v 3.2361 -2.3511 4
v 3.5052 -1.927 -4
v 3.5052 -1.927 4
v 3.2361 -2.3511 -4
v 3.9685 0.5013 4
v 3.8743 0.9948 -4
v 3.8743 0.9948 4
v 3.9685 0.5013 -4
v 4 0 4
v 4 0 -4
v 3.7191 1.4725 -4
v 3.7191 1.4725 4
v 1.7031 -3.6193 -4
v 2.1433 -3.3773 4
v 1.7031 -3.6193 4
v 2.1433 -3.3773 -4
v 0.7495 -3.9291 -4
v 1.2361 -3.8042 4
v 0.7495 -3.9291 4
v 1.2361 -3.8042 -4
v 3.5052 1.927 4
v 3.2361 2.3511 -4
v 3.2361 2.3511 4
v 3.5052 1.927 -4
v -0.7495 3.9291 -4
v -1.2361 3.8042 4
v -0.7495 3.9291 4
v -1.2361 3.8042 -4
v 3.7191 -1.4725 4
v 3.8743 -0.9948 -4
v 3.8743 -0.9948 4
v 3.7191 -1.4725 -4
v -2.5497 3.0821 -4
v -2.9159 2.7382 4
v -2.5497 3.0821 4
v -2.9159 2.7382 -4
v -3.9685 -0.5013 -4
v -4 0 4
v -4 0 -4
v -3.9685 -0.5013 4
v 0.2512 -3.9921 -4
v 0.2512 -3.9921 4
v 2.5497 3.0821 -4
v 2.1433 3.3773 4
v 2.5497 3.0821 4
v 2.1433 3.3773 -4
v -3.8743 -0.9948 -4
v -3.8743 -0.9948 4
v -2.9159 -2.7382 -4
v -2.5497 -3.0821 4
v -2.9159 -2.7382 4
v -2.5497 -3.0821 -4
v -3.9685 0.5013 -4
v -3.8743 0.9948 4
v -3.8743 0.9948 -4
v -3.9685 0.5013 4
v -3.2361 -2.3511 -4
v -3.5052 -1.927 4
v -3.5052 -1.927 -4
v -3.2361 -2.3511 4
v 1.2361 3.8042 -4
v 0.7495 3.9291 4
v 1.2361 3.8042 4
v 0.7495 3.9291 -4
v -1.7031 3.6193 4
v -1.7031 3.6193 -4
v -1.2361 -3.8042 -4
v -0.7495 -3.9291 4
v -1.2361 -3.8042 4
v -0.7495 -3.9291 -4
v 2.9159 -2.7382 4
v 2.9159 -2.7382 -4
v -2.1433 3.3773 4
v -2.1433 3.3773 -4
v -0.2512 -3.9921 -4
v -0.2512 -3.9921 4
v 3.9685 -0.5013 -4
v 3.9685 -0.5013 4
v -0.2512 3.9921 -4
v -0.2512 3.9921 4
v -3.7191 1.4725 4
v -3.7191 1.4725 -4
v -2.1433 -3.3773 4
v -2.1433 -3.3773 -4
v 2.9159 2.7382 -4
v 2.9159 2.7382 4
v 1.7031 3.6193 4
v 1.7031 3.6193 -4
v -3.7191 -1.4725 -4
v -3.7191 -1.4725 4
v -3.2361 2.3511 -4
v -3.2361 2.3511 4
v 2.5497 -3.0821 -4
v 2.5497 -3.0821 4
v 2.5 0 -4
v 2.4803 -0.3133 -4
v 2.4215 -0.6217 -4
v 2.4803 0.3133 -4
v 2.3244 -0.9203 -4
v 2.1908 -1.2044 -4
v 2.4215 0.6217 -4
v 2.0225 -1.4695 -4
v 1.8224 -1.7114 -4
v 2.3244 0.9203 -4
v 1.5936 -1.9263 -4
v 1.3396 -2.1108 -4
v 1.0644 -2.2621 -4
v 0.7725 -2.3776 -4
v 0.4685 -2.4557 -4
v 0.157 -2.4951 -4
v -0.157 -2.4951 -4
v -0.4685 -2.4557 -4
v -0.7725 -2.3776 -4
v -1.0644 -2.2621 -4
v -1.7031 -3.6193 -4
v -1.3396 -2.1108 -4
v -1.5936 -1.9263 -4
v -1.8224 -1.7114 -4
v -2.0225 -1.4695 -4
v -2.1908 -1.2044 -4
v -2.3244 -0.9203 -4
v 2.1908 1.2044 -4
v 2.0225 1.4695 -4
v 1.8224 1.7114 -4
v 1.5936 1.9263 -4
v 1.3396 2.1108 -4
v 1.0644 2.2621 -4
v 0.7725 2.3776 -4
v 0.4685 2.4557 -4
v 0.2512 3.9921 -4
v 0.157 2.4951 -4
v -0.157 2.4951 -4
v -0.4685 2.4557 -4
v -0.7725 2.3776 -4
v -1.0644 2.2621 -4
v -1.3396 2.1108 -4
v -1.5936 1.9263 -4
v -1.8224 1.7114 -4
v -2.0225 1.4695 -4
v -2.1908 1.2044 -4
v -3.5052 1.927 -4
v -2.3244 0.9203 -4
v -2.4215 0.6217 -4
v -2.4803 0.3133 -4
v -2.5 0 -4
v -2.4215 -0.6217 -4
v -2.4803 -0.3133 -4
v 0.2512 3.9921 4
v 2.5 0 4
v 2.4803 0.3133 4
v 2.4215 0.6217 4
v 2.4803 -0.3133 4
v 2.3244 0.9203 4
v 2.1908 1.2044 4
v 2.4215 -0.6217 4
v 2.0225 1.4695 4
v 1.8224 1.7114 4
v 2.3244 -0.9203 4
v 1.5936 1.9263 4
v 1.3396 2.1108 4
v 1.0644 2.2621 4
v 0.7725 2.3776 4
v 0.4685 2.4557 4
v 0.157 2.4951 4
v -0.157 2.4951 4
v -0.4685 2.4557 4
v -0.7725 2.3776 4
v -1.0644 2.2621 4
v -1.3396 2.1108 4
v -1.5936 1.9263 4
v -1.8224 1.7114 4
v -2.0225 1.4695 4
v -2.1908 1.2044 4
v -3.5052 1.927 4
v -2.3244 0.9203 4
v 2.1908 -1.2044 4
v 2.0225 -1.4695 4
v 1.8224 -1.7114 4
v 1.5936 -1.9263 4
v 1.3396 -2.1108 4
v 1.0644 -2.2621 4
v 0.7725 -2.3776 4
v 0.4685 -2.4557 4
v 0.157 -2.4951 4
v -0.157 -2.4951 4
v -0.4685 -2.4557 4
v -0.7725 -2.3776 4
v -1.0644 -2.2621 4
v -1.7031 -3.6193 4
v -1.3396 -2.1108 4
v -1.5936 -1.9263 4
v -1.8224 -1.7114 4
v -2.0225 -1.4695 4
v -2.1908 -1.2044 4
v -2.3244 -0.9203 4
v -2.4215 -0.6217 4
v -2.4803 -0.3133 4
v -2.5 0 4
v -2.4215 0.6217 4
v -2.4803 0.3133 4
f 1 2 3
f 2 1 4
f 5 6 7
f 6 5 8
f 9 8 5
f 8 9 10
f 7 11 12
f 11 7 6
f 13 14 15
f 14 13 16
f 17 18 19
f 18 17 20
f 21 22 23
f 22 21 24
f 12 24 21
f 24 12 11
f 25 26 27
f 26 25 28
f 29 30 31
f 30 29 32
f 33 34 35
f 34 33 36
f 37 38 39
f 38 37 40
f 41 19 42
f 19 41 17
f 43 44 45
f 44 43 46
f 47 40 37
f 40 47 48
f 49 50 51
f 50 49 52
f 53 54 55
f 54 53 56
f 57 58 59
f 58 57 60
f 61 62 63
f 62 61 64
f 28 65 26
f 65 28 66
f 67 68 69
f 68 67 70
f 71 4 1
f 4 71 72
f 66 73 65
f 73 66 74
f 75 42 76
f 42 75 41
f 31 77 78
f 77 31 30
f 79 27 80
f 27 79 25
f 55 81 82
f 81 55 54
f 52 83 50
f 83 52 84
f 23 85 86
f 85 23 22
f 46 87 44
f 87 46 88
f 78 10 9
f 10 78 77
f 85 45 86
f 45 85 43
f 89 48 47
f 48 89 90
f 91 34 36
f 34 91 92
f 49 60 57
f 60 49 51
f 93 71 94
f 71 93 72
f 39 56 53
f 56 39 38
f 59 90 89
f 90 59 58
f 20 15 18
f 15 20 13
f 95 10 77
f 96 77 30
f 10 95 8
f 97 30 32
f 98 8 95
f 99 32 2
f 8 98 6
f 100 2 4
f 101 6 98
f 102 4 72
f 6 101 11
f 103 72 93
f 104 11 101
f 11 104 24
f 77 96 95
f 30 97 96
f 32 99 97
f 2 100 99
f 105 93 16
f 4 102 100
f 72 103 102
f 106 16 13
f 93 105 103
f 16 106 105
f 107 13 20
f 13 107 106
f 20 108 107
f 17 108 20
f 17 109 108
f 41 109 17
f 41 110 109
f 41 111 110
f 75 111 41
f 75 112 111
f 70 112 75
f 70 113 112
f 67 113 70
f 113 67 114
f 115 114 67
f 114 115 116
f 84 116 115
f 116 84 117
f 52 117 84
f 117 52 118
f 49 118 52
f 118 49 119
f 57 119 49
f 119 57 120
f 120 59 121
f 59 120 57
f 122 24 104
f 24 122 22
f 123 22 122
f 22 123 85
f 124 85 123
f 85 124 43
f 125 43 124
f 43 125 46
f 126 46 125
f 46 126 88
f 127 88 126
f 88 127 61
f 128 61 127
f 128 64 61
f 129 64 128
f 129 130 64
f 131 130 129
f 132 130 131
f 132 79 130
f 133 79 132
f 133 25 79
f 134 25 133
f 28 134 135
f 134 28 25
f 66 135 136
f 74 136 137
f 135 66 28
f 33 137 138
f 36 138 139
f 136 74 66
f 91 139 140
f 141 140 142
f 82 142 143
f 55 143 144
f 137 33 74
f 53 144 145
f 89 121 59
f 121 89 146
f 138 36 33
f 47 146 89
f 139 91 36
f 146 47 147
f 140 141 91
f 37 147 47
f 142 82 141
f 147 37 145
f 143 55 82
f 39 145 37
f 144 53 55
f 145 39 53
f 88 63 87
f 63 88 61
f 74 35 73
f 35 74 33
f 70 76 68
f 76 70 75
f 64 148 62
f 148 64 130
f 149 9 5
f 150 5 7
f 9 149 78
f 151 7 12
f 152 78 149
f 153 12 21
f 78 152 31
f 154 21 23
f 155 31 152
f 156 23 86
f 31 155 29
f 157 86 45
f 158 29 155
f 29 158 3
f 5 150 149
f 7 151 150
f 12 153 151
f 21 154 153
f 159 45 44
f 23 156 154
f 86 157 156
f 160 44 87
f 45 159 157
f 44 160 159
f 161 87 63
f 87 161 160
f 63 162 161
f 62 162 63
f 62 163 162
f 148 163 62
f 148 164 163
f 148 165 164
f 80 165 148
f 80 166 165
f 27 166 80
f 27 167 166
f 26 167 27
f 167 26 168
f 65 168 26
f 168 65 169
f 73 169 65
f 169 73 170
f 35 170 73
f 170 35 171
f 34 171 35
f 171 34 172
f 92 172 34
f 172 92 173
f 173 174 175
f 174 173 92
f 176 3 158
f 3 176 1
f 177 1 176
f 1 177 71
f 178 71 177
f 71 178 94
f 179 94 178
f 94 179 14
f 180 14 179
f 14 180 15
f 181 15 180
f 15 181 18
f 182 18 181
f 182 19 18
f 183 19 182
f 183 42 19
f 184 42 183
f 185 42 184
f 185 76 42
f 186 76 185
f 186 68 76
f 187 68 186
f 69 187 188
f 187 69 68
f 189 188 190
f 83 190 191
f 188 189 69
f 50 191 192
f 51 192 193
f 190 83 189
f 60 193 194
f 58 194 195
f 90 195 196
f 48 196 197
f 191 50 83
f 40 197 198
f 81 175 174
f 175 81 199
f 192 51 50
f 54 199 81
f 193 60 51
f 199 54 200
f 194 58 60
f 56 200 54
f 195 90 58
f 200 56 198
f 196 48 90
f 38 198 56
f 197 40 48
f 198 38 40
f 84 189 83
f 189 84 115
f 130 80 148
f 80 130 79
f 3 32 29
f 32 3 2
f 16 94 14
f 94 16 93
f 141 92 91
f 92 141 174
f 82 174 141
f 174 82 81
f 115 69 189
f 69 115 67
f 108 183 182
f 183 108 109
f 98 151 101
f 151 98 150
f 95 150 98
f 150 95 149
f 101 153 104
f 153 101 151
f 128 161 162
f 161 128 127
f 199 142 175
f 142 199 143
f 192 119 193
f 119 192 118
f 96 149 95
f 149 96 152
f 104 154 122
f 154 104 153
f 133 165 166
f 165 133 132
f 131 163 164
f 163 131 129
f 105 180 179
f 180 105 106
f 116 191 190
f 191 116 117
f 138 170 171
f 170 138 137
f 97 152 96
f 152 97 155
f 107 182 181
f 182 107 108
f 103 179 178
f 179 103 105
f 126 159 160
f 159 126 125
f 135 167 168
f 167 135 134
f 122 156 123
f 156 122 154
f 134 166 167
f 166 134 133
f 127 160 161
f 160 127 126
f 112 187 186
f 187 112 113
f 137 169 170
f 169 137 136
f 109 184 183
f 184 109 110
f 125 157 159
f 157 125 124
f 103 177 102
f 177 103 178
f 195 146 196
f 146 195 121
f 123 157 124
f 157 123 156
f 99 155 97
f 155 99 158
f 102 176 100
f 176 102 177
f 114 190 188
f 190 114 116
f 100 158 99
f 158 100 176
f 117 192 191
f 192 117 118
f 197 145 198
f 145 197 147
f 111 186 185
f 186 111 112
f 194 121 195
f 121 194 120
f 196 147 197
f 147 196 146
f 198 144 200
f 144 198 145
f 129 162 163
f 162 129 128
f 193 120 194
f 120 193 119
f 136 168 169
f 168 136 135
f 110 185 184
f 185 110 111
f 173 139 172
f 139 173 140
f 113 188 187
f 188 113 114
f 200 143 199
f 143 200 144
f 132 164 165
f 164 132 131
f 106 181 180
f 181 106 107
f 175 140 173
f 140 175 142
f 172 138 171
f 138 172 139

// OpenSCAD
$fn = 50;


difference() {
	union() {
		translate(v = [0, 0, -4.0000000000]) {
			cylinder(h = 8, r = 4.0000000000);
		}
	}
	union() {
		translate(v = [0, 0, -100.0000000000]) {
			cylinder(h = 200, r = 2.5000000000);
		}
	}
}
